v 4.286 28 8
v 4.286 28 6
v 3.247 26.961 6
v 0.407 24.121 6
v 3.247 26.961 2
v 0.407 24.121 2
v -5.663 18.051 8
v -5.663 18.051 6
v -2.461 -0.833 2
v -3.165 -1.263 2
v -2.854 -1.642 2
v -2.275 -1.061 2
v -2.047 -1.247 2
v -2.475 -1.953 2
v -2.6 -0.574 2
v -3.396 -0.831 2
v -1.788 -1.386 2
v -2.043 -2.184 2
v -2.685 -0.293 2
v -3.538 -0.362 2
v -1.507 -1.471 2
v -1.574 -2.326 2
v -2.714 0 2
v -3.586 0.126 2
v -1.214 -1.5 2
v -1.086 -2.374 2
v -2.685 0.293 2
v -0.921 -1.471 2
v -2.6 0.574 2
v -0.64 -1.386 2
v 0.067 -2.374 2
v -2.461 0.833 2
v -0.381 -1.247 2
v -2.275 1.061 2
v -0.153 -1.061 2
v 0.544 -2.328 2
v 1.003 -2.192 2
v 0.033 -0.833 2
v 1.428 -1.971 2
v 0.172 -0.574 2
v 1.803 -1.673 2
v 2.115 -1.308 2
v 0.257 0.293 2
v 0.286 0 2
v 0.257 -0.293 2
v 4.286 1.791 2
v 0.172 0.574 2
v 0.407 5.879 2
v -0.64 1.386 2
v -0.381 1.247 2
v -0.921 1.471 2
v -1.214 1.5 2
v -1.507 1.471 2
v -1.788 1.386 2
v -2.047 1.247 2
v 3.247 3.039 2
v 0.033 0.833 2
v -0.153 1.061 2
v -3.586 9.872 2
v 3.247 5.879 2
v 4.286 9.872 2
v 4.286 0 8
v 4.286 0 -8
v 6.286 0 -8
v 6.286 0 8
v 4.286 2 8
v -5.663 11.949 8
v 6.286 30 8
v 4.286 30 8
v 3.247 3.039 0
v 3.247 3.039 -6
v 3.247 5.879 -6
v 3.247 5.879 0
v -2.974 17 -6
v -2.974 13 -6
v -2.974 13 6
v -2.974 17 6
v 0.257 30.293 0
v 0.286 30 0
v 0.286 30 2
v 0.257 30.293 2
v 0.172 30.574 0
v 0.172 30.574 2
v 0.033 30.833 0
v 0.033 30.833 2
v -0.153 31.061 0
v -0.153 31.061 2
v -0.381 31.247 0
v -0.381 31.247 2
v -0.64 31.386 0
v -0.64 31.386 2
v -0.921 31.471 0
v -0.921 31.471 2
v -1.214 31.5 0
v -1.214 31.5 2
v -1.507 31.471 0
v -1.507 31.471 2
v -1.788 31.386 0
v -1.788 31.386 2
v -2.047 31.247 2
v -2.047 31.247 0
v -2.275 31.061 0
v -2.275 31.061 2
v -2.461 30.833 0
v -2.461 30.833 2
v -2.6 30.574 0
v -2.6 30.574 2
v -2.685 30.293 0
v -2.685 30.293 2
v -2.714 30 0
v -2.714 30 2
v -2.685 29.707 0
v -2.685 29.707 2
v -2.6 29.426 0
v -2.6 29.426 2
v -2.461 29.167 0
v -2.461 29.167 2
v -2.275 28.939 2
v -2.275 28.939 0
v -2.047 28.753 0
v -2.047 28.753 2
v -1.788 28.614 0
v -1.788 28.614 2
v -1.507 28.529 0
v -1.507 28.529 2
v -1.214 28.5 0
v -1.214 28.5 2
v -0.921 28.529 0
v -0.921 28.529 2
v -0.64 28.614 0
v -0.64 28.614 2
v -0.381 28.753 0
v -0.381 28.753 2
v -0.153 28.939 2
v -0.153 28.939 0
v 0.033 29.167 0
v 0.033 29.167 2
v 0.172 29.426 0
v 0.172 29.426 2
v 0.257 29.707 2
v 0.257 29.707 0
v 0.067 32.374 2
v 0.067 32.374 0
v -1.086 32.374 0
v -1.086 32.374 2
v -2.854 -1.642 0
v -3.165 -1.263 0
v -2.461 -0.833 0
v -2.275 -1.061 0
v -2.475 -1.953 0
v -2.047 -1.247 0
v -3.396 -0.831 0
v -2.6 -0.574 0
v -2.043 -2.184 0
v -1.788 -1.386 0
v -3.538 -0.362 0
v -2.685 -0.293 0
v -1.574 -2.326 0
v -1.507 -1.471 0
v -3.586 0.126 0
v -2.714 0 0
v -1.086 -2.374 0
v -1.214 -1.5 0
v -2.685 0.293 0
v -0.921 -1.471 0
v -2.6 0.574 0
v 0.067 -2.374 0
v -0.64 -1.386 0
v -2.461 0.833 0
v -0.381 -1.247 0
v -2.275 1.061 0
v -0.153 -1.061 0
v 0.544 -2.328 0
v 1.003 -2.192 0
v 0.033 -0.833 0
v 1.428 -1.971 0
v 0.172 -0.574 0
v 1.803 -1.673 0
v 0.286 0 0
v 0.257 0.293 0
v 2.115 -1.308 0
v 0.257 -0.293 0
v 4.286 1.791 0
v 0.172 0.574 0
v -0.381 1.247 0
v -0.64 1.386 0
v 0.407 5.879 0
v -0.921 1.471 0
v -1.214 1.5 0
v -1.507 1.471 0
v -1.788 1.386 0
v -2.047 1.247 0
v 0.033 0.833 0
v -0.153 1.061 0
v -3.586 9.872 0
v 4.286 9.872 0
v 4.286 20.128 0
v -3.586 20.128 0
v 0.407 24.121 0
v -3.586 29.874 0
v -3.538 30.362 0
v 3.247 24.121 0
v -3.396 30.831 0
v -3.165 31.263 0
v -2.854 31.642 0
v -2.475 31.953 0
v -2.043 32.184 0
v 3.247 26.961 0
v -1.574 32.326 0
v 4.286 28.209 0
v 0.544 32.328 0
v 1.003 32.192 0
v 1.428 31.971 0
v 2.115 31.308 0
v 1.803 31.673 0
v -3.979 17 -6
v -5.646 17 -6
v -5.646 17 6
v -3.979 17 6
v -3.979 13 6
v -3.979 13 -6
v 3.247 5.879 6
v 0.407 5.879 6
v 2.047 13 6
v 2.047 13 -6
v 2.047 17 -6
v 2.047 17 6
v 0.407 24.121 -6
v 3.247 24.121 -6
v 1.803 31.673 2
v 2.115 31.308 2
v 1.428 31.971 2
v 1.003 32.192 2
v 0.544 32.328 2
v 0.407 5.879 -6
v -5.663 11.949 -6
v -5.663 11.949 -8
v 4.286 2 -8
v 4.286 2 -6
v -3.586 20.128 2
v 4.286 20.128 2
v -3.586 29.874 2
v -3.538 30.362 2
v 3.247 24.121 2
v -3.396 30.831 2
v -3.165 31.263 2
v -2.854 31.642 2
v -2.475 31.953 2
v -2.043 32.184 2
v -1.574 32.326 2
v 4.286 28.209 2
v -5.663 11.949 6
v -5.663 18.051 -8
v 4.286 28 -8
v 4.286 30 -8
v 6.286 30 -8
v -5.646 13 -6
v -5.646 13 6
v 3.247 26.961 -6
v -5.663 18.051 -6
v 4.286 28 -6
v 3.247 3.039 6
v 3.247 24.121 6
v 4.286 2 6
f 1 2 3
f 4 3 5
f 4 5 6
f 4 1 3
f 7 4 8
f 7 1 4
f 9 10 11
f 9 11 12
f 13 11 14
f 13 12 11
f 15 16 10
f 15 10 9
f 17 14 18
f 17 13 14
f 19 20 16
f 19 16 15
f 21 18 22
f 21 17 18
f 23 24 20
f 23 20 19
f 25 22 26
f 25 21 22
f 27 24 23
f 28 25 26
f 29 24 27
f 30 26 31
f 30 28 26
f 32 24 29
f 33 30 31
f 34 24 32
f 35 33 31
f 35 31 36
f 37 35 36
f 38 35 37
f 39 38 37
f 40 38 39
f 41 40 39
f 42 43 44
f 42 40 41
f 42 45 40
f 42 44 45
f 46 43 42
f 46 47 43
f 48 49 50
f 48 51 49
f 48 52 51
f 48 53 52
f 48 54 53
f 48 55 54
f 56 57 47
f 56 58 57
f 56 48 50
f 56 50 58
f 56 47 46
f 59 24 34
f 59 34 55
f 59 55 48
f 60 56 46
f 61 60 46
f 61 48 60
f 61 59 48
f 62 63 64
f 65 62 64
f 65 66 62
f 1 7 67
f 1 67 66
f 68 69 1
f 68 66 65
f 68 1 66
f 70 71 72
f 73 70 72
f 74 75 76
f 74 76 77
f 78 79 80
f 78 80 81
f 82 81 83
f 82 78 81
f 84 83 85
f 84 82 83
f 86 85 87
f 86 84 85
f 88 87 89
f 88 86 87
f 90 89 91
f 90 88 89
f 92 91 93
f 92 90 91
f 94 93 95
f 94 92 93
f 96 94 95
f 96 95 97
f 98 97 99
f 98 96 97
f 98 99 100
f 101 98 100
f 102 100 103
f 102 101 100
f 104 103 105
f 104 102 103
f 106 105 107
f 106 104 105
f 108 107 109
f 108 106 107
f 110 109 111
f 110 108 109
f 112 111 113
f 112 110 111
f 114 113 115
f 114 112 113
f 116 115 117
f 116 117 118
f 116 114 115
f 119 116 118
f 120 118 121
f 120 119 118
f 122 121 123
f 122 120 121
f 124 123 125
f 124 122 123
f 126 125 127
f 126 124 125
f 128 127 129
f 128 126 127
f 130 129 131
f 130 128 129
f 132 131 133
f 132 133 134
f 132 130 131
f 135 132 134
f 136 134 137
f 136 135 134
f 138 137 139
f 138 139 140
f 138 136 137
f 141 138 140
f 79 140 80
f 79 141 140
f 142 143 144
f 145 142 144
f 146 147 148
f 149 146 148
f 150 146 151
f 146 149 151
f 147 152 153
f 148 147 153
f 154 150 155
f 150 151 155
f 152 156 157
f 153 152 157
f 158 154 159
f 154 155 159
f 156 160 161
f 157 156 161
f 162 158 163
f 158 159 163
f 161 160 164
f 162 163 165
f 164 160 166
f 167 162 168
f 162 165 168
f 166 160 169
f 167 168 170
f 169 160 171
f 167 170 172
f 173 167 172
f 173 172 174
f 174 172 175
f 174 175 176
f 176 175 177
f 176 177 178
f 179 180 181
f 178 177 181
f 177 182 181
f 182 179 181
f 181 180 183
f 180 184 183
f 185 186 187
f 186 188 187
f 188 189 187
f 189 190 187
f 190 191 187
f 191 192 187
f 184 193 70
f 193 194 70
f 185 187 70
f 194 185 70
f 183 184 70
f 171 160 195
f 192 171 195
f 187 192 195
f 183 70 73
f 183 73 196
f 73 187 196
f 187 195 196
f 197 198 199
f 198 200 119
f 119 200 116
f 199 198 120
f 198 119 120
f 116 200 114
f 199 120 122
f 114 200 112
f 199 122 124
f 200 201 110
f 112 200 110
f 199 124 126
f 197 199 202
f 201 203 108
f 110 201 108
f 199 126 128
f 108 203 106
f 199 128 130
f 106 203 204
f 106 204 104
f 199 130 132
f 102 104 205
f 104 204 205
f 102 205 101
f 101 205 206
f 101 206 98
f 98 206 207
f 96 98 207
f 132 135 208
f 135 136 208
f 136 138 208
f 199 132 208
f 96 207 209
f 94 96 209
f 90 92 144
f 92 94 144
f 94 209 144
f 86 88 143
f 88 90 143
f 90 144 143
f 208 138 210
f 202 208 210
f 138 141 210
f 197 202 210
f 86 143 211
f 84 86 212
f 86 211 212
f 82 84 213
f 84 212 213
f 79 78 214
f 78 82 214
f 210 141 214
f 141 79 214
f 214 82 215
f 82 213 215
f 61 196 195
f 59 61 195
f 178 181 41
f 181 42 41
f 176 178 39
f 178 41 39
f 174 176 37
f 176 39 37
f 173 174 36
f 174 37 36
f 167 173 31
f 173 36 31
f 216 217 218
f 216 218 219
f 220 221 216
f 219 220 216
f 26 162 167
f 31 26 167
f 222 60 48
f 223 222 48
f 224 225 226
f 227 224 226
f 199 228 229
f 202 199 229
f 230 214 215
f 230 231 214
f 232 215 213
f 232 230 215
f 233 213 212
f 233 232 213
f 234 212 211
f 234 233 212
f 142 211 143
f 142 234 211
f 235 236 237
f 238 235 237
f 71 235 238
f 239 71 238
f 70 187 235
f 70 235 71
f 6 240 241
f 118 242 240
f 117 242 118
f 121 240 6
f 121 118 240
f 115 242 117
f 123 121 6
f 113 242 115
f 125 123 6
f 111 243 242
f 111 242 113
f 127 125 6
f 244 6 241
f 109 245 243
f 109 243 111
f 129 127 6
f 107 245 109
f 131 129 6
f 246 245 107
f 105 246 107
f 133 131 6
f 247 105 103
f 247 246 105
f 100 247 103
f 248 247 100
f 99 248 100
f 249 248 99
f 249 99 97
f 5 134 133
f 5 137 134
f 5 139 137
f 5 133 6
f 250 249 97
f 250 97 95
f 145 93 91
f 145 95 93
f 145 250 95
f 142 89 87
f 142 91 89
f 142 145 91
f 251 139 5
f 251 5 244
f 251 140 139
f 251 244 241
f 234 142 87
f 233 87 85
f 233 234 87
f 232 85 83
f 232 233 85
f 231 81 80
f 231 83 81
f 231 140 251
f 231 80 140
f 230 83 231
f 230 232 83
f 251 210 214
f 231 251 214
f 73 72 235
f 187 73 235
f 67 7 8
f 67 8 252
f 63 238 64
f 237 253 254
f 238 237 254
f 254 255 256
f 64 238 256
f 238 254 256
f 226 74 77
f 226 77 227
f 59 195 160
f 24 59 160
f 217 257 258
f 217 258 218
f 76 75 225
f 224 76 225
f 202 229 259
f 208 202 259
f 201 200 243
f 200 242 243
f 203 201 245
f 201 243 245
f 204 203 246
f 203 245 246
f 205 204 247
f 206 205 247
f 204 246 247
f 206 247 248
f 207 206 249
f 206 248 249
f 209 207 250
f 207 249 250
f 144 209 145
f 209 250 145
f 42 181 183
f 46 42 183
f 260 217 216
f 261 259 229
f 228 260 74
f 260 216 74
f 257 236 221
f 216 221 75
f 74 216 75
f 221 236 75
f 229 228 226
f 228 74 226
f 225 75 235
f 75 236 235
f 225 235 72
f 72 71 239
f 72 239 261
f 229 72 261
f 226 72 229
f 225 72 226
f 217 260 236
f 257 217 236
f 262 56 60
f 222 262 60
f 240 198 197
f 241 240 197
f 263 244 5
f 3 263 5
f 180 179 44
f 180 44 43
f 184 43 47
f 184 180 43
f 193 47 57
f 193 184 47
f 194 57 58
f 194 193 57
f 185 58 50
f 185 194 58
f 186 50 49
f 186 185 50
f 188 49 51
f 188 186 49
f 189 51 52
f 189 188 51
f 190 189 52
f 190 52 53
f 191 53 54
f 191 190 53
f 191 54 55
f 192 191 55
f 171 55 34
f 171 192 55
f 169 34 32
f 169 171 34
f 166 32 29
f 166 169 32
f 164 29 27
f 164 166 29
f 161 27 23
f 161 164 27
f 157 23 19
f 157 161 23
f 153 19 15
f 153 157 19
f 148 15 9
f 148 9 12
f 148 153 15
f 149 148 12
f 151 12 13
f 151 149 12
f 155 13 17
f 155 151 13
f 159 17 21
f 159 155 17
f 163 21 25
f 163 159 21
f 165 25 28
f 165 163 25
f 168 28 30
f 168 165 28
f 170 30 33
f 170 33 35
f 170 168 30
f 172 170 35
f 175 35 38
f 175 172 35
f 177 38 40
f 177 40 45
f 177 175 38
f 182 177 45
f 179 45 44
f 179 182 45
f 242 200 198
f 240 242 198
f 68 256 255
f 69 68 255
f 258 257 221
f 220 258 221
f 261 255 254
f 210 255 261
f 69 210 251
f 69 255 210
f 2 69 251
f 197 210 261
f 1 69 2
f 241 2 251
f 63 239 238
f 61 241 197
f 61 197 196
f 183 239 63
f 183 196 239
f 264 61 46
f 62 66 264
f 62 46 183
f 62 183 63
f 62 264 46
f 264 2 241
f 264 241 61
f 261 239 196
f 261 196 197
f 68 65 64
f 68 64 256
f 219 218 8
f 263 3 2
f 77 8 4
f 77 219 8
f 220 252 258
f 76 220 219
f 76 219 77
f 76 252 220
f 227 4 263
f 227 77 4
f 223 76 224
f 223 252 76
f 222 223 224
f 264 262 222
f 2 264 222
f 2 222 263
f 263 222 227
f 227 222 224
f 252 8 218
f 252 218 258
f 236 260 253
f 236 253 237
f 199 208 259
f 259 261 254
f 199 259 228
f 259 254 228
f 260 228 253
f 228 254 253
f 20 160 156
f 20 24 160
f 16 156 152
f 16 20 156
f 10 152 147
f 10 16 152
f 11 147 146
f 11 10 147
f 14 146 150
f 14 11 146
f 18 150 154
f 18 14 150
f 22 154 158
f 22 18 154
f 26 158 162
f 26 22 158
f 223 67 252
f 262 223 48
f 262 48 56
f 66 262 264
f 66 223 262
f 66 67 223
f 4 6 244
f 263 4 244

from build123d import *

# Parameters (mm, degrees)
F1_DEPTH      = 8
F1_DEPTH_BACK = 8
F2_W          = 11
F2_H          = 12
F3_DEPTH      = 30.001
F4_R          = 1.5
F5_DEPTH      = 2
F6_R          = 2.5
F8_DEPTH      = 16
F9_W          = 5.021157
F9_H          = 4
F9_W_2        = 1.667027
F10_DEPTH     = 12


with BuildPart() as f1:
    # F0 (on Top) → F1 (new body, two sides)
    with BuildSketch(Plane.XY) as f1_sk:
        Polygon((-5.6634, 11.949274), (6.285874, 0), (6.285874, 30), (-5.6634, 18.050726), align=None)
    extrude(amount=F1_DEPTH)
    extrude(f1_sk.sketch, amount=-F1_DEPTH_BACK)

    # F2 (on Front) → F3 (cut, through all)
    with BuildSketch(Plane.XZ):
        with Locations((-1.214126, 0)):
            Rectangle(F2_W, F2_H)
    extrude(amount=-F3_DEPTH, mode=Mode.SUBTRACT)

    # F4 (on Top) → F5 (join)
    with BuildSketch(Plane.XY):
        Polygon((4.371856, 9.871843), (-3.585968, 9.871843), (-3.585968, -2.374122), (1.36807, -2.374122), (4.371856, 1.914018), align=None)
        with Locations((-1.214126, 0)):
            Circle(F4_R, mode=Mode.SUBTRACT)
        Polygon((-3.585968, 20.128157), (4.371856, 20.128157), (4.371856, 28.085982), (1.36807, 32.374122), (-3.585968, 32.374122), align=None)
        with Locations((-1.214126, 30)):
            Circle(F4_R, mode=Mode.SUBTRACT)
    extrude(amount=F5_DEPTH)

    # F6
    f6_edges = [f1.edges().sort_by_distance(p)[0] for p in [
        (-3.585968, -2.374122, 1),
        (1.36807, -2.374122, 1),
        (-3.585968, 32.374122, 1),
        (1.36807, 32.374122, 1),
    ]]
    fillet(f6_edges, radius=F6_R)

    # F7 (on face) → F8 (join, through all)
    with BuildSketch(Plane.XY.offset(8)):
        Polygon((4.285874, 0), (6.285874, 0), (4.285874, 2), align=None)
        Polygon((4.285874, 28), (6.285874, 30), (4.285874, 30), align=None)
    extrude(amount=-F8_DEPTH)

    # F9 (on face) → F10 (join, through all)
    with BuildSketch(Plane.XY.offset(-6)):
        with Locations((-0.463468, 15)):
            Rectangle(F9_W, F9_H)
        with Locations((-4.812499, 15)):
            Rectangle(F9_W_2, F9_H)
        Polygon((3.246619, 24.120981), (3.246619, 26.960745), (0.406855, 24.120981), align=None)
        Polygon((0.406855, 5.879019), (3.246619, 3.039255), (3.246619, 5.879019), align=None)
    extrude(amount=F10_DEPTH)


solid = f1.part
